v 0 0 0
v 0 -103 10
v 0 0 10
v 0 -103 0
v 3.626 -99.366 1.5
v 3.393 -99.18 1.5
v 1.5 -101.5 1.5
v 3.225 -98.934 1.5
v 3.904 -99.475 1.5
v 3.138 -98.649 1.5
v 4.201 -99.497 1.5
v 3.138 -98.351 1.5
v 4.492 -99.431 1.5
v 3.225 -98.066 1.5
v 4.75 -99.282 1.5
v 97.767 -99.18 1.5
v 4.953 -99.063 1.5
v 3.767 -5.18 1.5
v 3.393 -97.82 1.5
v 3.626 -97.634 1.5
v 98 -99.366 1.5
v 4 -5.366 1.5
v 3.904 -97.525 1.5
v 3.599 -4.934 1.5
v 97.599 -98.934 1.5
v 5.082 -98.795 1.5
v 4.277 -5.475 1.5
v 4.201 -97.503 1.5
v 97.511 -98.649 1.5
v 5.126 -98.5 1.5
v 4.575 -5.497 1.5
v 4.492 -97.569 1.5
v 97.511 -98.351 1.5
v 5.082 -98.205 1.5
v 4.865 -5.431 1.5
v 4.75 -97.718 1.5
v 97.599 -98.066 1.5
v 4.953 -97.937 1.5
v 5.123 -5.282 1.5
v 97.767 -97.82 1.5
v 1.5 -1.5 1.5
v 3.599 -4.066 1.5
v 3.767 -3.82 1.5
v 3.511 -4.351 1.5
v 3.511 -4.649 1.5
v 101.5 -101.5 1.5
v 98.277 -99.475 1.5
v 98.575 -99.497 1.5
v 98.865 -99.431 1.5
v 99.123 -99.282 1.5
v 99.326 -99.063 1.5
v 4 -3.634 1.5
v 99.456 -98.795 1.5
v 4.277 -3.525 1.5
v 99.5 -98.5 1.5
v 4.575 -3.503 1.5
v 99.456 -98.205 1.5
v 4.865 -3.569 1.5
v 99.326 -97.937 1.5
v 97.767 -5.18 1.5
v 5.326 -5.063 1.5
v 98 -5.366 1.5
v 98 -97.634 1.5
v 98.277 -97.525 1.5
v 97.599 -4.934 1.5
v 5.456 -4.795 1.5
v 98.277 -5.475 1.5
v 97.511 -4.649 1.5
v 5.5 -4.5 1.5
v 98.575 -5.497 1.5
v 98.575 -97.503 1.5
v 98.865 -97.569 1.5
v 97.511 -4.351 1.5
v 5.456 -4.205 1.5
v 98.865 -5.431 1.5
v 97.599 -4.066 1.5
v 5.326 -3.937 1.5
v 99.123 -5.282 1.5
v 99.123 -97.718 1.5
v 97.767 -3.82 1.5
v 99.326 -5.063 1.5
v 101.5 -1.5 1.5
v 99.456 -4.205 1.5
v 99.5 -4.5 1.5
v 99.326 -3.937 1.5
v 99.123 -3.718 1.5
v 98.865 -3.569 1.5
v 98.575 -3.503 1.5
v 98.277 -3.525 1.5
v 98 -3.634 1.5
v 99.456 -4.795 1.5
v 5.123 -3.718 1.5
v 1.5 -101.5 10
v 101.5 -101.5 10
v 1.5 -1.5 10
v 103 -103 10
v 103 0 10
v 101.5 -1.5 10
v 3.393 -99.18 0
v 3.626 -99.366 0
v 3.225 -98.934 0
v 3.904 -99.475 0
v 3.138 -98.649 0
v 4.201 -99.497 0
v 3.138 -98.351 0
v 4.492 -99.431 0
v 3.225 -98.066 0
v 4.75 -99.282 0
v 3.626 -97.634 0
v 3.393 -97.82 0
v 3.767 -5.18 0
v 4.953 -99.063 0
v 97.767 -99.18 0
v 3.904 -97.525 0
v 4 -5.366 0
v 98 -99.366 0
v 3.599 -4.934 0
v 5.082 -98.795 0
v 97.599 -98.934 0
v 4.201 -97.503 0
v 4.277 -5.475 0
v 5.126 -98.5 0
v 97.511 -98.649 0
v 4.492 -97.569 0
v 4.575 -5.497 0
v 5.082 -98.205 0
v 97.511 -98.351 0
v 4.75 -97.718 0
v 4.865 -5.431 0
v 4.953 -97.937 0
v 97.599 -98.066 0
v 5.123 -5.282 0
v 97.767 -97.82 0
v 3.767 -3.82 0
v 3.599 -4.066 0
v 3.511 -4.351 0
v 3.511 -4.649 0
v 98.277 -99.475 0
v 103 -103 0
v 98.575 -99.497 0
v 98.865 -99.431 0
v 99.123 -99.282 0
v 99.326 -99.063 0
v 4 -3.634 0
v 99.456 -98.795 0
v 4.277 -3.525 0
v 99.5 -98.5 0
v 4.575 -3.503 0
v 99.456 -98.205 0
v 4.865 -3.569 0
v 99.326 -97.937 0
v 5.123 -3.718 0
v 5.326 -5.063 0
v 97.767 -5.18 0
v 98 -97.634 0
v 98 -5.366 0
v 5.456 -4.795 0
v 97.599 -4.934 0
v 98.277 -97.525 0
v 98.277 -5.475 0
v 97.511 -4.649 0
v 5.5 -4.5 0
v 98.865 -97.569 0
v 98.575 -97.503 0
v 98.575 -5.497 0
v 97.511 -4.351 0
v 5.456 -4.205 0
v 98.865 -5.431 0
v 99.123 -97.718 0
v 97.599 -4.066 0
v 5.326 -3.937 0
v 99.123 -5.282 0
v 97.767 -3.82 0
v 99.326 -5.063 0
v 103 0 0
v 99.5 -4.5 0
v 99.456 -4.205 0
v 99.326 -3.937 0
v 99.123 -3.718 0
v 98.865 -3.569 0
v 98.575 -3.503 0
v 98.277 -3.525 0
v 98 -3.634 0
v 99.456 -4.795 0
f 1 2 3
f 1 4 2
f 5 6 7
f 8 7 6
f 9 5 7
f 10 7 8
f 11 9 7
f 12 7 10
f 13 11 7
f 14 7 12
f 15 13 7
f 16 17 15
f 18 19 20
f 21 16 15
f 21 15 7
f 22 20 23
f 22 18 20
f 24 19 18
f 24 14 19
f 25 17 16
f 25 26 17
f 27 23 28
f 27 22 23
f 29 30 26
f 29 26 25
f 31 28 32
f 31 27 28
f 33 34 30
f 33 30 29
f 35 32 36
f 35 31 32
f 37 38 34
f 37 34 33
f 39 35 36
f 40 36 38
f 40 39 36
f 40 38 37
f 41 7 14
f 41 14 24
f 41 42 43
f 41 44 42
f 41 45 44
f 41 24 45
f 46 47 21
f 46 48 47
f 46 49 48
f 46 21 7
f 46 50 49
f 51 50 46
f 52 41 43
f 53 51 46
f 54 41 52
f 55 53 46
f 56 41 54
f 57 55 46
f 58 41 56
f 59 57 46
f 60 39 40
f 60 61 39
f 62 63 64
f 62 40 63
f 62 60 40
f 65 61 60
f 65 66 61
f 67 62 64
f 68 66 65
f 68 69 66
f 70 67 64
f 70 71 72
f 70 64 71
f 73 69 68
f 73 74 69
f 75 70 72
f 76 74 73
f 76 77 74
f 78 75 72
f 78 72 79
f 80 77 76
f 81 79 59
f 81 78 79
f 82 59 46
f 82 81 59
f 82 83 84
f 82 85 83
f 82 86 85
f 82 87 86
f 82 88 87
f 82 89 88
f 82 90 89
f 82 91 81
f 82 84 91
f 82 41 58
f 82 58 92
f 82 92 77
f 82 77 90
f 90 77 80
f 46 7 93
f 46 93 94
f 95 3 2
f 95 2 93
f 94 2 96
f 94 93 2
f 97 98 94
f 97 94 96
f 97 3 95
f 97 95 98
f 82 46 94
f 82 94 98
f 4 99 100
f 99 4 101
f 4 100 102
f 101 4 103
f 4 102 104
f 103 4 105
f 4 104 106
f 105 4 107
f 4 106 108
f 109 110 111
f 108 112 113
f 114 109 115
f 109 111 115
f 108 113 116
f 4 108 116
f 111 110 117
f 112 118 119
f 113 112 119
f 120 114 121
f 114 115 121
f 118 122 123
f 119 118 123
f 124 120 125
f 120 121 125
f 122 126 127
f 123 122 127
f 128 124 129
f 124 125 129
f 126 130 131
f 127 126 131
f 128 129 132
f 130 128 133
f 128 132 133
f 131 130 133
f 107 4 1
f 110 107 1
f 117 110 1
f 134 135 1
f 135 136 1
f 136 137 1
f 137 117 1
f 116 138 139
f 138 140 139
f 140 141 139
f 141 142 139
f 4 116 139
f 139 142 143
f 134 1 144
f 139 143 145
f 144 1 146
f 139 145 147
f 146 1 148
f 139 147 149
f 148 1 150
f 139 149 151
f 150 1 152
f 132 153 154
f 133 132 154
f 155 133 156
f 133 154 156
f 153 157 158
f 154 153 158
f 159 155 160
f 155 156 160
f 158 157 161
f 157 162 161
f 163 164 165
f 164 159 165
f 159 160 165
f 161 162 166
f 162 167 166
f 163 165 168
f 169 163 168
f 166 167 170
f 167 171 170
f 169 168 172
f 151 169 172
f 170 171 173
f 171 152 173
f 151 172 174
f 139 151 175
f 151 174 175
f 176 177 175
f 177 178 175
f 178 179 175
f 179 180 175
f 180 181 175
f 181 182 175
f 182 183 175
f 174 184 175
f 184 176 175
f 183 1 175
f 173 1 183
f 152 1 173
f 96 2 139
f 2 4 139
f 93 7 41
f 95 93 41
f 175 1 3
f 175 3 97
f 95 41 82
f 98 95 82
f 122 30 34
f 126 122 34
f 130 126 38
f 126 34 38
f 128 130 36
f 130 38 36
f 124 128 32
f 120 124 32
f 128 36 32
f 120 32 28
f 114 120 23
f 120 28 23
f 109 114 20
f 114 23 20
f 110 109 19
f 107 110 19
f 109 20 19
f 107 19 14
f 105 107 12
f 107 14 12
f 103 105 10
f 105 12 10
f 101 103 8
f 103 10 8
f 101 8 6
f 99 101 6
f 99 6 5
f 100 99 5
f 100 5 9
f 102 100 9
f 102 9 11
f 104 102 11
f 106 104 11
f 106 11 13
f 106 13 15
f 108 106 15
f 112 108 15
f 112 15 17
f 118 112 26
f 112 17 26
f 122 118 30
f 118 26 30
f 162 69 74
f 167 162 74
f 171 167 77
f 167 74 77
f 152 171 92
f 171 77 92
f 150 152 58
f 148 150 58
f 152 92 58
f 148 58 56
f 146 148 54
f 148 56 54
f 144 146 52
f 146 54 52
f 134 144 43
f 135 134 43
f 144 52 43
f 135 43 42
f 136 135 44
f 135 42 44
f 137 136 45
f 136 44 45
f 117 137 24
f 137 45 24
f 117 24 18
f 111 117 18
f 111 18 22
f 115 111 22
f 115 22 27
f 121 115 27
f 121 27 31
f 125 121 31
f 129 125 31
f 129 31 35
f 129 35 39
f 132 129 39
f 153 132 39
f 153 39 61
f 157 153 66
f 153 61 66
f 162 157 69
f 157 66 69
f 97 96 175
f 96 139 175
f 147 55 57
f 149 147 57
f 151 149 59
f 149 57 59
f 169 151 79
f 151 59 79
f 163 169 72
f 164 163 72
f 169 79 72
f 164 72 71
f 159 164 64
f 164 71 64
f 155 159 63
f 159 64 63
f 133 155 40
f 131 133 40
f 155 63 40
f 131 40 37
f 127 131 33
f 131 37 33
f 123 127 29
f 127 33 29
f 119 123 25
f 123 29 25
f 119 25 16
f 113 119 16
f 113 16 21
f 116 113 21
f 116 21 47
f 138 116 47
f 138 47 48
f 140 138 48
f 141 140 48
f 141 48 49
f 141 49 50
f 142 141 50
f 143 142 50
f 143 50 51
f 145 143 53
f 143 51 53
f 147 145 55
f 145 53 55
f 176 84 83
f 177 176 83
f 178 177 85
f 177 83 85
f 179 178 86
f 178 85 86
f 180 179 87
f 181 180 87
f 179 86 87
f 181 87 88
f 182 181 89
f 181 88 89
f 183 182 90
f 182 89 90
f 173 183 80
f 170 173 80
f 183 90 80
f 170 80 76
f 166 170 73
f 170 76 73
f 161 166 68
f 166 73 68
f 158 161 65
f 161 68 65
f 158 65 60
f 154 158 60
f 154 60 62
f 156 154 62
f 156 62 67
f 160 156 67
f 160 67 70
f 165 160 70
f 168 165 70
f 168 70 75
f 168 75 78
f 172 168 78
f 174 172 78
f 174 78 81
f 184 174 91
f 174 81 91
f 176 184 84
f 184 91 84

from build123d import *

# Parameters (mm, degrees)
SKETCH_1_W          = 103
SKETCH_1_H          = 103
EXTRUDE_1_DEPTH     = 1.5
SKETCH_3_W          = 103
SKETCH_3_H          = 103
SKETCH_3_W_2        = 100
SKETCH_3_H_2        = 100
EXTRUDE_2_DEPTH     = 8.5
SKETCH_4_R          = 1
CUT_EXTRUDE_1_DEPTH = 1.5


with BuildPart() as part:
    # 草图1 → 凸台-拉伸1 (new body)
    with BuildSketch(Plane.XY):
        with Locations((51.5, -51.5)):
            Rectangle(SKETCH_1_W, SKETCH_1_H)
    extrude(amount=EXTRUDE_1_DEPTH)

    # 草图3 → 凸台-拉伸2 (add)
    with BuildSketch(Plane.XY.offset(1.5)):
        with Locations((51.5, -51.5)):
            Rectangle(SKETCH_3_W, SKETCH_3_H)
        with Locations((51.5, -51.5)):
            Rectangle(SKETCH_3_W_2, SKETCH_3_H_2, mode=Mode.SUBTRACT)
    extrude(amount=EXTRUDE_2_DEPTH)

    # 草图4 → 切除-拉伸1 (cut)
    with BuildSketch(Plane.XY.offset(1.5)):
        with Locations((4.126355777, -98.5)):
            Circle(SKETCH_4_R)
        with Locations((98.5, -98.5)):
            Circle(SKETCH_4_R)
        with Locations((98.5, -4.5)):
            Circle(SKETCH_4_R)
        with Locations((4.5, -4.5)):
            Circle(SKETCH_4_R)
    extrude(amount=-CUT_EXTRUDE_1_DEPTH, mode=Mode.SUBTRACT)


solid = part.part
